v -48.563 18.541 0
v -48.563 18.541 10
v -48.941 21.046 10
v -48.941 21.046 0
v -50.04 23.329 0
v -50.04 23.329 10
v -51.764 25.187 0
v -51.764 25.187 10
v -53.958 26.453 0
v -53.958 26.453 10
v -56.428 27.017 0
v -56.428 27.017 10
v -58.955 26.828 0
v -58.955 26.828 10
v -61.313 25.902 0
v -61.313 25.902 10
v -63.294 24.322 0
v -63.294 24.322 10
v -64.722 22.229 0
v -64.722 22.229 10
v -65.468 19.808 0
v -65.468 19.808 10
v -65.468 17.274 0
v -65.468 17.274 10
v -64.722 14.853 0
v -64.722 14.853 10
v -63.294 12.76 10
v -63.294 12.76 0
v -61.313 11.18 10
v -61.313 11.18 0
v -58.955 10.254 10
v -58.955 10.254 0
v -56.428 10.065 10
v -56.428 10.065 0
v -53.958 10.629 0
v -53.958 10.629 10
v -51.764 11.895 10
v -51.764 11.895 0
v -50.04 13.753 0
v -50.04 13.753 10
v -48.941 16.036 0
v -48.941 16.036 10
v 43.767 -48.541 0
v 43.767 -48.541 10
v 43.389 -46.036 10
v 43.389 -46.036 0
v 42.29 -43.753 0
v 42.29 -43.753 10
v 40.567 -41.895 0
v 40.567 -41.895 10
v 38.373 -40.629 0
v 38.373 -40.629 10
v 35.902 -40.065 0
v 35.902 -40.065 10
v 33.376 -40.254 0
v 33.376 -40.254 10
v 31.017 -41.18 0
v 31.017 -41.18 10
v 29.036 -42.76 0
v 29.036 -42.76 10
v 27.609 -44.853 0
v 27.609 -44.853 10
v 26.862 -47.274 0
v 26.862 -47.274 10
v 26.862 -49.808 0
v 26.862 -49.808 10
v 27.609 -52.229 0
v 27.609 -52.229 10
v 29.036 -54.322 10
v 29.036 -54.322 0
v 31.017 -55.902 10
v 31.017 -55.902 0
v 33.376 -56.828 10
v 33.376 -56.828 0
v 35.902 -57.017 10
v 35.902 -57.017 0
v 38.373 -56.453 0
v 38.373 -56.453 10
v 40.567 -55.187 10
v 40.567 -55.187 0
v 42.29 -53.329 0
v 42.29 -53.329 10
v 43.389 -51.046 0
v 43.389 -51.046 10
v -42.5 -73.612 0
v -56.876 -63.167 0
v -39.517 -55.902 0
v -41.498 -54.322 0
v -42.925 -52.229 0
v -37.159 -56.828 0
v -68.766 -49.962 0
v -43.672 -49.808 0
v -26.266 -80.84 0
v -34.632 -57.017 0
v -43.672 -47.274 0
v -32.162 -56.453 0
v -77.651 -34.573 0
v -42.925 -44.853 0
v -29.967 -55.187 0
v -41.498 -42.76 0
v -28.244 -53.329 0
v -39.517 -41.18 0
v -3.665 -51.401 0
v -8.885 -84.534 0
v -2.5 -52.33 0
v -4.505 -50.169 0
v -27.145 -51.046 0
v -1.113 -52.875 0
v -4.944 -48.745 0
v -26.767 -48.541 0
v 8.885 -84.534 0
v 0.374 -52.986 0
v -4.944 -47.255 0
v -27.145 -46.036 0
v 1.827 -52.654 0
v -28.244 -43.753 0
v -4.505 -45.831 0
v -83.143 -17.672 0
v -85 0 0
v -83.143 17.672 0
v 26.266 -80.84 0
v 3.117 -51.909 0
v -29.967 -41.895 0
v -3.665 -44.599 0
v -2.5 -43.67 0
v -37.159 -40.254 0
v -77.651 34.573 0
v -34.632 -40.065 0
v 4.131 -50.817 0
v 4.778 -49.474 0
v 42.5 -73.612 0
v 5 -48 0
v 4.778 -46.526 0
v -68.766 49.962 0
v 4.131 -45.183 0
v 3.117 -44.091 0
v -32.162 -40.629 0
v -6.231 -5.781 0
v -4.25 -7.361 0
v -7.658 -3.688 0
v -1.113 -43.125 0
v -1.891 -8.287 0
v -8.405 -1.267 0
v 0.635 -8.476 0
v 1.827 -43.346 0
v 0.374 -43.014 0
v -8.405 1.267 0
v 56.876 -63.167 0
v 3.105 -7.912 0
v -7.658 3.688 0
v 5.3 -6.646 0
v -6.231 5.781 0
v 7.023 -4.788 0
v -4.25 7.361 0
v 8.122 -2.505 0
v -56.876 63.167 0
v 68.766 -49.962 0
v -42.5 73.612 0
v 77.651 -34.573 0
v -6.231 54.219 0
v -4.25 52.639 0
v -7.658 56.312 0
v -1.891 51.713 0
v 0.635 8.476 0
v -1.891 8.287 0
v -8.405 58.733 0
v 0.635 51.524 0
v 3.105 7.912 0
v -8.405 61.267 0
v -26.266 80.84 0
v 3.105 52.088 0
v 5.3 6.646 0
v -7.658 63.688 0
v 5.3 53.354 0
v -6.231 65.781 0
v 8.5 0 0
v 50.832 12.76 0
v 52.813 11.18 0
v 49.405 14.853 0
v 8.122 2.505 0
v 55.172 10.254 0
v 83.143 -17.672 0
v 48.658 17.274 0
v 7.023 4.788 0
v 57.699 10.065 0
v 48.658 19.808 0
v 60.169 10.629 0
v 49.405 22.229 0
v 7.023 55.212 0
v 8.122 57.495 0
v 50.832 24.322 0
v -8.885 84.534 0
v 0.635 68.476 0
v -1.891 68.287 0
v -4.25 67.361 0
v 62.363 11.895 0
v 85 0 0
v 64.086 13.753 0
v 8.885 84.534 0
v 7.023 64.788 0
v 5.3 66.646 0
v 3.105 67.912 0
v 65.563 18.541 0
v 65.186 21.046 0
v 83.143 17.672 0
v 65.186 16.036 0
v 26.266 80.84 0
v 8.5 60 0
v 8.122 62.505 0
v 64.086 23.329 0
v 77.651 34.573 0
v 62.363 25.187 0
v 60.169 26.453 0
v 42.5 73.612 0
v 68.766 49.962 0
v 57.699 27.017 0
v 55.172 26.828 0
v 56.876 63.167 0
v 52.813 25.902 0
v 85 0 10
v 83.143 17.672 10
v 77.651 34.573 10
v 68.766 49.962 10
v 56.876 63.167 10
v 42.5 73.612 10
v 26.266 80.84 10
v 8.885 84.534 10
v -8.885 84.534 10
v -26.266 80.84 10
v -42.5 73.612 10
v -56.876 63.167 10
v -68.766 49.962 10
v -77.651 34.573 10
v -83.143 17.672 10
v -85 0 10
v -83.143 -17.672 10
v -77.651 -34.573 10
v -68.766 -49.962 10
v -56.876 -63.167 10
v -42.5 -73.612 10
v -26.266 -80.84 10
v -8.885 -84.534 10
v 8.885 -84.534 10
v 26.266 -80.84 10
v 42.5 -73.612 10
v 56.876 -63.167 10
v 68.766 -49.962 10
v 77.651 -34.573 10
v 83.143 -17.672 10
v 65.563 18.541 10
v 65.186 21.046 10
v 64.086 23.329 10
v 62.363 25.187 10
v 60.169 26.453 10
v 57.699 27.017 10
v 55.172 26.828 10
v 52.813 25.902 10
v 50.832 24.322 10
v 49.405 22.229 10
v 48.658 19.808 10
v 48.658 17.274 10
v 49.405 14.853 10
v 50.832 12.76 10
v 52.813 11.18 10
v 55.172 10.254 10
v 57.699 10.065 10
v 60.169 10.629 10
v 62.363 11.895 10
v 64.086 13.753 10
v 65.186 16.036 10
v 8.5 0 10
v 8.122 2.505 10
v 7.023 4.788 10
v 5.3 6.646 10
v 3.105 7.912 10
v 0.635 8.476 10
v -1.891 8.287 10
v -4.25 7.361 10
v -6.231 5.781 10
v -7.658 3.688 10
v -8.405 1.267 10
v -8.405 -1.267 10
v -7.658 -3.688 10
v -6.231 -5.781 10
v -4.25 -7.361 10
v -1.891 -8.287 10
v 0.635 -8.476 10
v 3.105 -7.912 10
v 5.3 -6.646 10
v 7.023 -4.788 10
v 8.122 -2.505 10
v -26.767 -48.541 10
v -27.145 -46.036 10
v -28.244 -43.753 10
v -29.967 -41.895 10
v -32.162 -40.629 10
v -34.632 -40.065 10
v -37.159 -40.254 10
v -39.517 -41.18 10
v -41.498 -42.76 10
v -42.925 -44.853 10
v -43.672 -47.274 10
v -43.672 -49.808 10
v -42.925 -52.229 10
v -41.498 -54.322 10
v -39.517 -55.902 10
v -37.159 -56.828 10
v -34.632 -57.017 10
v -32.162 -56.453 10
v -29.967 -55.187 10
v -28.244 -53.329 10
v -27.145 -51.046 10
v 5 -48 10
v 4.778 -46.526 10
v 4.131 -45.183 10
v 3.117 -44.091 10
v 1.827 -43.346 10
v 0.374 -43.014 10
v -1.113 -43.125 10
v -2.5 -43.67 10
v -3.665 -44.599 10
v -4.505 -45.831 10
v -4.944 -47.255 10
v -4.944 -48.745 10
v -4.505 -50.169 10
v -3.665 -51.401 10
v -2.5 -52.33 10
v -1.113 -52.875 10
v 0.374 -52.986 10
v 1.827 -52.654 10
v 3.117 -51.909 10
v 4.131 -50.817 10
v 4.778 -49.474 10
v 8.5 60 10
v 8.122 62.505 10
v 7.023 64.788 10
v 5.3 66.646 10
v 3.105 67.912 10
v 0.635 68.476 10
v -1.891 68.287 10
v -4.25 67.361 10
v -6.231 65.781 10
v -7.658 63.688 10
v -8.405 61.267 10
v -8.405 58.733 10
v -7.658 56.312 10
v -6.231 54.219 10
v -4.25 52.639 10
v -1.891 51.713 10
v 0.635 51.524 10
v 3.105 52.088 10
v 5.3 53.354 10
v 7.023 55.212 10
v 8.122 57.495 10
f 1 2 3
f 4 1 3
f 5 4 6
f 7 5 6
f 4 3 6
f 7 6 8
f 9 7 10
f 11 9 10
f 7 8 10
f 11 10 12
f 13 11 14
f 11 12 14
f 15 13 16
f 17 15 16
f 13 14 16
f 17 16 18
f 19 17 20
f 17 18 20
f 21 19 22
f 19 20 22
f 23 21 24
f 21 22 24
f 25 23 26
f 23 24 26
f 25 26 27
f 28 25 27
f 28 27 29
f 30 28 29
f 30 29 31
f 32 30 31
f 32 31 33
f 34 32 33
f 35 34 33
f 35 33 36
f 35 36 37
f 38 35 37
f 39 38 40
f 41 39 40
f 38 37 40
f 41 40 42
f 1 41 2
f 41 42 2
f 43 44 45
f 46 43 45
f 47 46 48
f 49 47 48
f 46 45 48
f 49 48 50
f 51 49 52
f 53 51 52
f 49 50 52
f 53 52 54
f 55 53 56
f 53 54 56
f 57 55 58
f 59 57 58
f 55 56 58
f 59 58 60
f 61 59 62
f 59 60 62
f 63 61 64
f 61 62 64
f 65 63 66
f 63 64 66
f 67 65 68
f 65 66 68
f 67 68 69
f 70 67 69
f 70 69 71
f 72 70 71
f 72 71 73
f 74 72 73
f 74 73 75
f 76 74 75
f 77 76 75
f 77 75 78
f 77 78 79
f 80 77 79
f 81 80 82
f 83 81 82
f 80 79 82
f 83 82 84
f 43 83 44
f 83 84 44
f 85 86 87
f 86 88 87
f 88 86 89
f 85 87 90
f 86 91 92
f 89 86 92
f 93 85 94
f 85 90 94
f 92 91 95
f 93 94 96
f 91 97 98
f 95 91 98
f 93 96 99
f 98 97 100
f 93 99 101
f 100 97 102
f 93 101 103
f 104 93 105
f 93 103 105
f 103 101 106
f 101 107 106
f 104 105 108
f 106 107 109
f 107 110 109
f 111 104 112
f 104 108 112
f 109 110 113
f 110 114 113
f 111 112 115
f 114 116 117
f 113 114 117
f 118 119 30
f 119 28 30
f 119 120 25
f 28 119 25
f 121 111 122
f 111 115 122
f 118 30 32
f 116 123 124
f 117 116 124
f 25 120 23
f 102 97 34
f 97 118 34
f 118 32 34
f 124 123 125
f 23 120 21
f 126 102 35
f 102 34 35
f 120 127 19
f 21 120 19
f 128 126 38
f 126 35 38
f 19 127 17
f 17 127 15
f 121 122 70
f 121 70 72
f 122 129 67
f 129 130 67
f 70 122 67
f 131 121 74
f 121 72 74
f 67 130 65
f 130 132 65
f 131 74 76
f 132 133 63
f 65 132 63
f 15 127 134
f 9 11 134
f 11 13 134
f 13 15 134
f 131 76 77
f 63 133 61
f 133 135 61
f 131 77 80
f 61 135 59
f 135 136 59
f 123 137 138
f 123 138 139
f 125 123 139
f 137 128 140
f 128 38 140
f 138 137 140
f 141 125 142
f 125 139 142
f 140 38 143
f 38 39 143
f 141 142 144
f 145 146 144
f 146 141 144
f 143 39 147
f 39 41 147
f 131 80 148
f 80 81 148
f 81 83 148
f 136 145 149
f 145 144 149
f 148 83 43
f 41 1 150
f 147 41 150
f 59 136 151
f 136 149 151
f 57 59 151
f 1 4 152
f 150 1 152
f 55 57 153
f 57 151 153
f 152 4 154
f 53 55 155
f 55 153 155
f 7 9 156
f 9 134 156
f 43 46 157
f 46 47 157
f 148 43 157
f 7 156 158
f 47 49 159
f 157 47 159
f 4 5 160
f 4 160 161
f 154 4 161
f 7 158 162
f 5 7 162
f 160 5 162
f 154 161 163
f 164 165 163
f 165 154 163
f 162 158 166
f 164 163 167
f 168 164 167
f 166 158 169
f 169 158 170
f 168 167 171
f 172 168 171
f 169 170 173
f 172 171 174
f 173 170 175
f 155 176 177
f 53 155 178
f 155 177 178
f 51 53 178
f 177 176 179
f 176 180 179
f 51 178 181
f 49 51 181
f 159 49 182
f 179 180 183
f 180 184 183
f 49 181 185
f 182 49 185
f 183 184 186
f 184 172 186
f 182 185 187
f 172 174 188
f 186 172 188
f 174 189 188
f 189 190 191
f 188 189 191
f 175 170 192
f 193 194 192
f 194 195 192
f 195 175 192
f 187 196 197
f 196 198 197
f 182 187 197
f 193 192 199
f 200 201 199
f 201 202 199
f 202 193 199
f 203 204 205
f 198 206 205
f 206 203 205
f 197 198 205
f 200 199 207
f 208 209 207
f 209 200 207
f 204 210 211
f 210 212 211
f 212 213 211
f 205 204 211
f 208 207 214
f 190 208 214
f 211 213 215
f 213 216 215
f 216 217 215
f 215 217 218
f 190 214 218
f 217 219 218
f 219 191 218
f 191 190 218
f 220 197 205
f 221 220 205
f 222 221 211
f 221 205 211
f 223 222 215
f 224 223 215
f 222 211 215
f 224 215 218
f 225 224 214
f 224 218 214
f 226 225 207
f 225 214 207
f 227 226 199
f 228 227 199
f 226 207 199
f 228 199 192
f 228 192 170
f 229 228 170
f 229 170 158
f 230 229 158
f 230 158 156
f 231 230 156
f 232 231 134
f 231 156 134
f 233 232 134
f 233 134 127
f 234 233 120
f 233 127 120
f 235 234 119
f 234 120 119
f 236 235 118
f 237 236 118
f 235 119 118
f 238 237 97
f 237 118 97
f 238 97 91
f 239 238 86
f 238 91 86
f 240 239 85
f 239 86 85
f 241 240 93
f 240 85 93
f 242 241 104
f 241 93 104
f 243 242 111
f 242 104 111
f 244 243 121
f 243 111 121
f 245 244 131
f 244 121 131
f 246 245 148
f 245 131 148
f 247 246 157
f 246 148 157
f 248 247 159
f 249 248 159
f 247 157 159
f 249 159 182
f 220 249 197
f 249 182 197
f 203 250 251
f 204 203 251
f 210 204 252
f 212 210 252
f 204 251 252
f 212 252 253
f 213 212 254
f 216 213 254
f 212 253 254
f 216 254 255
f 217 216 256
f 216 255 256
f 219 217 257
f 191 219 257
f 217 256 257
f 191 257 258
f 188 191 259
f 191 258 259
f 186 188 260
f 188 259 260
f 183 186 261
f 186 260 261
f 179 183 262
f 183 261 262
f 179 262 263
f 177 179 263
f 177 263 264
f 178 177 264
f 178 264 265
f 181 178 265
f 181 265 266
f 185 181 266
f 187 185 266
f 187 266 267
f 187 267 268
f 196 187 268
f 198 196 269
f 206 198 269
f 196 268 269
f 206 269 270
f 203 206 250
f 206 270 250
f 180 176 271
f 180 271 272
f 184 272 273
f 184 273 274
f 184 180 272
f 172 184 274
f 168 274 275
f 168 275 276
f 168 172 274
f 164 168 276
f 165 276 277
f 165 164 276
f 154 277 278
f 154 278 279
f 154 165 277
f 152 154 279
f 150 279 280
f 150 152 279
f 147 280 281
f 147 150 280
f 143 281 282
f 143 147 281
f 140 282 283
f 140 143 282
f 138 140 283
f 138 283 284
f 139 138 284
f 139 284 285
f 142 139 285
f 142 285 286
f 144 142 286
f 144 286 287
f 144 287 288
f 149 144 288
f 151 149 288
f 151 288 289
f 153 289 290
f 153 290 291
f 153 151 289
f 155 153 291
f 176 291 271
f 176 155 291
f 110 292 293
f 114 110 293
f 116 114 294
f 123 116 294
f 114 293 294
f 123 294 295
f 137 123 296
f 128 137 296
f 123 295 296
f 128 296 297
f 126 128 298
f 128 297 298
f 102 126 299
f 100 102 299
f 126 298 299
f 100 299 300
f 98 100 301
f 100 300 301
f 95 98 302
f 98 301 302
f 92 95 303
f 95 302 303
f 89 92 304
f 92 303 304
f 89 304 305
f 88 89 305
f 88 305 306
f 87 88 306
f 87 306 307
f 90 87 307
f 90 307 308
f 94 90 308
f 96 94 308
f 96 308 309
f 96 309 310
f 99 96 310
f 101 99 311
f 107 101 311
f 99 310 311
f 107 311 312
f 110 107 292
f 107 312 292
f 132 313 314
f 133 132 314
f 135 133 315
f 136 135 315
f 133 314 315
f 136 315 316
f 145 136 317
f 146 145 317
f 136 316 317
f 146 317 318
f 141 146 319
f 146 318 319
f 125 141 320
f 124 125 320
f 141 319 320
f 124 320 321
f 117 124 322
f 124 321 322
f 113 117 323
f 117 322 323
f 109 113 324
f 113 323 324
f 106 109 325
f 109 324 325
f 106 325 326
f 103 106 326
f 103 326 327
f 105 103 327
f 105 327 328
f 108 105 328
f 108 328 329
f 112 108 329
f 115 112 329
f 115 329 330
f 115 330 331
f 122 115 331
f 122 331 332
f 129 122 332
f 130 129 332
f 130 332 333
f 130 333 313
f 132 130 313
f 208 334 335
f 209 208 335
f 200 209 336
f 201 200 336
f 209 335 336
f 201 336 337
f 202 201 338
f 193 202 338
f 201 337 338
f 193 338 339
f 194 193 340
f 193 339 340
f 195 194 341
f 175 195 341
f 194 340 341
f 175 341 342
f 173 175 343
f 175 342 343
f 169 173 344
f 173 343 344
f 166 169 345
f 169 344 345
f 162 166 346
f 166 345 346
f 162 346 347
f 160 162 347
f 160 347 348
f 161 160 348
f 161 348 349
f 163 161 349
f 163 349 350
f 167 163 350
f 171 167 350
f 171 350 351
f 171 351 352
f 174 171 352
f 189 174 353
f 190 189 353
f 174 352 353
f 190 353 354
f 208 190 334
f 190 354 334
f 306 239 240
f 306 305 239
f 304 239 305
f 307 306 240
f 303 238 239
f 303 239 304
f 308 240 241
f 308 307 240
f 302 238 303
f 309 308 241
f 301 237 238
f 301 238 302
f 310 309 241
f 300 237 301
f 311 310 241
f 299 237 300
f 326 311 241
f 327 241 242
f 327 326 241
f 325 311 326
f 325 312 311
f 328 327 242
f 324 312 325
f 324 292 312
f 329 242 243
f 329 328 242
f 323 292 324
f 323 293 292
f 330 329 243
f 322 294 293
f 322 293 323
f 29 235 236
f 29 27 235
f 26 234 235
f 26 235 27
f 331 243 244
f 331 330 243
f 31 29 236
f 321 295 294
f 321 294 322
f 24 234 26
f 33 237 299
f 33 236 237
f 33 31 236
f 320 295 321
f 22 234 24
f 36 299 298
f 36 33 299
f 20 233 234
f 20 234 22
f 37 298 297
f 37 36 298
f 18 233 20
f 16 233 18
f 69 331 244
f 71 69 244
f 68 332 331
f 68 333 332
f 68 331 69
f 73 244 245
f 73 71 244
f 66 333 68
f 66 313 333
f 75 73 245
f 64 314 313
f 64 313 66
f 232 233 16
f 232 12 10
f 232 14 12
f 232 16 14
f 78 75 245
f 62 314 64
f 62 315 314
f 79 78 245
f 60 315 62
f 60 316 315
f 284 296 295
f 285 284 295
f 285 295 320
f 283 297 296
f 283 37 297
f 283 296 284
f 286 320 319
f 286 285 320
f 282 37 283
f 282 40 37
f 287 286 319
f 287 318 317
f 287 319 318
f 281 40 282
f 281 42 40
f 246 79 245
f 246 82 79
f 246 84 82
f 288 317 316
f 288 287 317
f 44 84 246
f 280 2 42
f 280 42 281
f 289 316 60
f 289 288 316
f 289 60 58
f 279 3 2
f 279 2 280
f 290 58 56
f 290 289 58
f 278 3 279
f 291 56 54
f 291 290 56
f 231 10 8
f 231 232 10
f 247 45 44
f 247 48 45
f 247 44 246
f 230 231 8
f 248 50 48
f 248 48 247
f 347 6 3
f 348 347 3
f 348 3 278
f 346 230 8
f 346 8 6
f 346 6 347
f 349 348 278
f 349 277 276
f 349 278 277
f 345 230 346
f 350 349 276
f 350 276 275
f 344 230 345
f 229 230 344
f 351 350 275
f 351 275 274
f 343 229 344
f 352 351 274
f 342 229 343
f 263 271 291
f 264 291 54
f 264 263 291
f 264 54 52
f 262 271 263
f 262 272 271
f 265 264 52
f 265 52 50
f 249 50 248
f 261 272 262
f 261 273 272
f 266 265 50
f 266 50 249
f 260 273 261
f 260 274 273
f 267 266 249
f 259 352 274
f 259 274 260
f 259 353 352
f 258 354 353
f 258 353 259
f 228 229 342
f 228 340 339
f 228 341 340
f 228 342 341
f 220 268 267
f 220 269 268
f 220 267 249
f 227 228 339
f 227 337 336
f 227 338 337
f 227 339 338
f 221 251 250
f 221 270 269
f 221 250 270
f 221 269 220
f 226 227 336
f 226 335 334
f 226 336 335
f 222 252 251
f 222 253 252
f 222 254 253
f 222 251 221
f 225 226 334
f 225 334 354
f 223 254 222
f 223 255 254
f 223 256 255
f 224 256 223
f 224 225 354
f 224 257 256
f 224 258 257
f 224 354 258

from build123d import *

# Parameters (mm, degrees)
SKETCH1_R           = 85
SKETCH1_R_2         = 8.5
BOSS_EXTRUDE1_DEPTH = 10
SKETCH2_R           = 8.5
CUT_EXTRUDE1_DEPTH  = 10
SKETCH4_R           = 5
CUT_EXTRUDE3_DEPTH  = 60


with BuildPart() as part:
    # Sketch1 → Boss-Extrude1 (new body)
    with BuildSketch(Plane.XY):
        Circle(SKETCH1_R)
        Circle(SKETCH1_R_2, mode=Mode.SUBTRACT)
    extrude(amount=BOSS_EXTRUDE1_DEPTH)

    # Sketch2 → Cut-Extrude1 (cut)
    with BuildSketch(Plane.XY.offset(10)):
        with Locations((0, 60)):
            Circle(SKETCH2_R)
        with Locations((57.063390978, 18.541019662)):
            Circle(SKETCH2_R)
        with Locations((35.267115138, -48.541019662)):
            Circle(SKETCH2_R)
        with Locations((-35.267115138, -48.541019662)):
            Circle(SKETCH2_R)
        with Locations((-57.063390978, 18.541019662)):
            Circle(SKETCH2_R)
    extrude(amount=-CUT_EXTRUDE1_DEPTH, mode=Mode.SUBTRACT)

    # Sketch4 → Cut-Extrude3 (cut)
    with BuildSketch(Plane.XY.offset(10)):
        with Locations((0, -48)):
            Circle(SKETCH4_R)
    extrude(amount=-CUT_EXTRUDE3_DEPTH, mode=Mode.SUBTRACT)


solid = part.part
